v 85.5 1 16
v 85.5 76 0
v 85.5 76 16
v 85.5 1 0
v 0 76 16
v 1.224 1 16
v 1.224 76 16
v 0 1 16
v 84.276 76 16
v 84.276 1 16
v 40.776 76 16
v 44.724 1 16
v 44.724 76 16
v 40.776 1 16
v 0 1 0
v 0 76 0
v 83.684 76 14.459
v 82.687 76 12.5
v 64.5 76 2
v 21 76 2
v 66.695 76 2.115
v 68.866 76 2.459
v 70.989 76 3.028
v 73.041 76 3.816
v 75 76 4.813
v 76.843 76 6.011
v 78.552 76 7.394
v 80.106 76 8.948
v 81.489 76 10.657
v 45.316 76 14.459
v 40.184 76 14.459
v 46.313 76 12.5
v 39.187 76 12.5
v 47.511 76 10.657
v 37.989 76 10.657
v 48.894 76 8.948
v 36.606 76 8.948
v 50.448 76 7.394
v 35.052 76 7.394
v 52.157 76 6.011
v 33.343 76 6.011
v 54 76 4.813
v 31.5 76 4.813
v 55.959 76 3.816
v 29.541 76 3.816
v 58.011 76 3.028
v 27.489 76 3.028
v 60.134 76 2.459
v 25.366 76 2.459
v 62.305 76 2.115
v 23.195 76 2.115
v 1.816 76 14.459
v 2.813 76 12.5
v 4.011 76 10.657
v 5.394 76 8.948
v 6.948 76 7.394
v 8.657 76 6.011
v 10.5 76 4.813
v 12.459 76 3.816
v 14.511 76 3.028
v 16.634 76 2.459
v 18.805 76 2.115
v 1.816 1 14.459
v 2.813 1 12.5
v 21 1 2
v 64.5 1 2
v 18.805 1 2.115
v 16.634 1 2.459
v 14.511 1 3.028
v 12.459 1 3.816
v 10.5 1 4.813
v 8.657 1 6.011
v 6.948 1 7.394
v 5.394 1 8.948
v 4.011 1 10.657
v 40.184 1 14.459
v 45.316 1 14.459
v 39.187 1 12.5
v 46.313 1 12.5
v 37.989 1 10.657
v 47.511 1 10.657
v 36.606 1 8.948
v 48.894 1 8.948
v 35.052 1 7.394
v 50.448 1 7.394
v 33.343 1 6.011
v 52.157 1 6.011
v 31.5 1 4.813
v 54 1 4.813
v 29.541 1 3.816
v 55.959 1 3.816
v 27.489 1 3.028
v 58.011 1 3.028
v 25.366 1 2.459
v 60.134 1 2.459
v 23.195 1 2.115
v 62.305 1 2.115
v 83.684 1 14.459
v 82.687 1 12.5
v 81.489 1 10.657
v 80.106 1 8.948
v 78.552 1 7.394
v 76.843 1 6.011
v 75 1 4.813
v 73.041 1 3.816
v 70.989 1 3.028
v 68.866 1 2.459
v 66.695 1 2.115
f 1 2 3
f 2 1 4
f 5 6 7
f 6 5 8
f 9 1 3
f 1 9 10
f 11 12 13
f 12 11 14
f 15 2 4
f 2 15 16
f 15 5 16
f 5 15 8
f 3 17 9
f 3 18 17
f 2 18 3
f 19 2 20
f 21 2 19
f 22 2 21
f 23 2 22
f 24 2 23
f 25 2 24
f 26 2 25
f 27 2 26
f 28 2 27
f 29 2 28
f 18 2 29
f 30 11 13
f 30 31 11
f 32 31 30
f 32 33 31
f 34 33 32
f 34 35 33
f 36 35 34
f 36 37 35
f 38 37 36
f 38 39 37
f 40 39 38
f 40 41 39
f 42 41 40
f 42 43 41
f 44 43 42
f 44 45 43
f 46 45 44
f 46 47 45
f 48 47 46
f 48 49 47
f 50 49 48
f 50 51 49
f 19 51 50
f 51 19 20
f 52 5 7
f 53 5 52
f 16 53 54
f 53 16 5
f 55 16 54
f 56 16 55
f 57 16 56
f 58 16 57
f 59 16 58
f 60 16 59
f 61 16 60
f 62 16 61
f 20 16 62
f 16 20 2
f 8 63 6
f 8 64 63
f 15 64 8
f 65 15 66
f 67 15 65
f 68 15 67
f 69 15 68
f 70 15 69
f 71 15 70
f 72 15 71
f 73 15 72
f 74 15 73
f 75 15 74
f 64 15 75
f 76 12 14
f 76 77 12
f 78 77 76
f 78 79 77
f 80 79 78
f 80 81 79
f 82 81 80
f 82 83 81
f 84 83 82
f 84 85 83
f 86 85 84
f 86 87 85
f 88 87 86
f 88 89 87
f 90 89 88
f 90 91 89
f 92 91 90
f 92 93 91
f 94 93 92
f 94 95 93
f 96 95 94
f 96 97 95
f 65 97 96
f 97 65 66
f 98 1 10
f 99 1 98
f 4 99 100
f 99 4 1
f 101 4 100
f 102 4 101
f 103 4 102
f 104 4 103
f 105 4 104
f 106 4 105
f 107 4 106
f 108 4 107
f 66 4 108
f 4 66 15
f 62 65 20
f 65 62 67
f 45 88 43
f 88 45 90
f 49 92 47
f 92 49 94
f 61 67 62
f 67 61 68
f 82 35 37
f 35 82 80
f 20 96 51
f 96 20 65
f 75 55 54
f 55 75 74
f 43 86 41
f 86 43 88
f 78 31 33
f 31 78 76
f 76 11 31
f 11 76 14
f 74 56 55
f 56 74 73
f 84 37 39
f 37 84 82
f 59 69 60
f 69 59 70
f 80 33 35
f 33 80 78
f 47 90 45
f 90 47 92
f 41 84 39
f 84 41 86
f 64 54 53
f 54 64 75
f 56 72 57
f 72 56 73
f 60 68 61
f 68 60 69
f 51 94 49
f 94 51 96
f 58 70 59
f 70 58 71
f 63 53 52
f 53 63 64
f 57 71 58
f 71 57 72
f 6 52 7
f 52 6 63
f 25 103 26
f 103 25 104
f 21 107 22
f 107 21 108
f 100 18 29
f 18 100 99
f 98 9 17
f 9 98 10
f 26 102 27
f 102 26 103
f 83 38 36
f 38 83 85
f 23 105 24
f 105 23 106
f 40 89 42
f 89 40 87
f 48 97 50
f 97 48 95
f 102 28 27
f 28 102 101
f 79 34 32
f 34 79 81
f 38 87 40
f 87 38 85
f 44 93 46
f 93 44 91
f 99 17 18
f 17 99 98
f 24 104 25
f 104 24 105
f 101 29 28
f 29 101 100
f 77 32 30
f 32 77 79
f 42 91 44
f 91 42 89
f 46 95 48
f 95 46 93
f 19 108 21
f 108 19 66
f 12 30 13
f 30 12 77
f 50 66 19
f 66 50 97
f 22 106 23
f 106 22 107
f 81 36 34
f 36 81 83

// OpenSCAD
// =============================================
// 3D: Horizontal Holder for 2 Bottles (75x42)
// Version: 1.0
// Author: ChatGPT (OpenSCAD)
// =============================================

// ----------------------------
description = "Horizontal holder for 2 bottles, d=42, len=75";

// Shared library
use <../modules.scad>

// ----------------------------
// Параметры модели
// ----------------------------
bottle_diam   = 42;      // диаметр бутылки, мм
bottle_y      = 75;     // длина бутылки по Y, мм
num_bottles   = 2;       // количество бутылок в ряду (по Y)
pad_between   = 1.5;     // прокладка/зазор между бутылками (1–2 мм)

// Габариты/толщины
rail_w        = 0;       // боковые рельсы убраны
rail_h        = 6;       // высота рельса по Z, мм
base_th       = 2;       // толщина тонкой базы между рельсами, мм
bridge_th     = 2;       // толщина облегчённых перемычек (мостов), мм
bridge_pitch  = 35;      // шаг перемычек по X, мм
end_stop_h    = 10;       // высота торцевых упоров, мм
end_stop_th   = 1;       // толщина торцевых упоров по X, мм
max_h         = 50;      // ограничение по высоте всей детали, мм

// Скругление краёв через minkowski
use_minkowski = false;    // включить скругление краёв
minkowski_r   = 1;       // радиус сферы для скругления, мм

// ----------------------------
// Настройка точности
// ----------------------------
$fn = 0;        // фиксированную сегментацию отключаем
$fa = 6;        // 5–8° обычно достаточно
$fs = 0.35;     // ≈ диаметр сопла (0.3–0.5 для сопла 0.4)
pin_fs = 0.25;  // для цилиндров высокой точности

// ----------------------------
// Тестовые фрагменты
// ----------------------------
test_fragment = false;  // true — печатать только укороченные фрагменты
frag_size     = 20;     // размер окна вырезки по XY
frag_index    = 0;      // 0=НЛ, 1=ВЛ, 2=НП, 3=ВП (относительно основания)
frag_gap_x    = 10;     // зазор между фрагментами по X, мм
frag_h_extra  = 12;     // запас по высоте клипа, мм

// Вычисляемые размеры
inner_w = num_bottles*bottle_diam + (num_bottles-1)*pad_between;      // рабочая ширина между рельсами
tot_w   = inner_w;// + 2*rail_w;                                          // общая ширина
tot_y   = bottle_y + end_stop_th;                                    // общая длина по Y (с упорами)

// Низкий подпрофиль «ложемента» — высота положительного сегмента
saddle_h = min(max_h - rail_h, bottle_diam/3);                         // не выше трети диаметра
saddle_w = max(bottle_diam/2, 12);                                     // ширина контакта по Y
// Срез по Z сверху на высоте торцевого упора
z_cap  = rail_h + end_stop_h;
// Полная высота модели для переворота по Z
total_h = z_cap;

// Центры бутылок по X (ранее по Y)
function bottle_center_x(i) = bottle_diam/2 + i*(bottle_diam + pad_between);

// ----------------------------
// Вспомогательные модули
// ----------------------------
// Режущий цилиндр для выемки (полуканавка) вдоль Y, ограниченный по высоте
module saddle_cutter(center_x){
    z_offset = 0;//bottle_diam / 10 * -1;
    intersection(){
        // цилиндр вдоль Y, начинается после нижнего упора и заканчивается перед верхним
        translate([center_x, end_stop_th, bottle_diam/2 + base_th])
            rotate([-90,0,0])
                cylinder(h=bottle_y, d=bottle_diam, $fs=pin_fs, $fa=6);
        // ограничиваем область выемки только внутренней зоной между рельсами и по Z до z_cap
        translate([0, end_stop_th, z_offset])
            cube([inner_w, bottle_y, z_cap], center=false);
    }
}


// Торцевые упоры по Y только между рельсами
module end_stop(){
    // у верхнего края
    translate([rail_w, tot_y - end_stop_th, rail_h]) cube([inner_w, end_stop_th, end_stop_h], center=false);
}

// Объединение всех выемок
module cradle_cuts(){
    for(i = [0 : num_bottles-1])
        saddle_cutter(bottle_center_x(i));
    // Убираем внешние стенки по краям: дополнительные полуканавки за пределами рабочей области
    saddle_cutter(-bottle_diam/2);
    saddle_cutter(inner_w + bottle_diam/2);
}

// Срезающий параллелепипед для верхней плоскости
module cut_top(){
    translate(v = [-10, -10, -z_cap])
        cube([inner_w+20, tot_y+20, 24], center=false);
}

// Сплошная внутреняя плита между рельсами на высоту выемки (будет облегчена вычитанием цилиндров)
module deck_core(){
    translate([0, end_stop_th, 0])
        cube([inner_w, bottle_y, z_cap], center=false);
}

// Полная сборка (сырая, без финального среза по Z)
module base_raw(){
    difference(){
        union(){
            deck_core();
            end_stop();
        }
        cradle_cuts();
        // cut_top();
    }
}

// Срезаем верх по z_cap на всякий случай
module base(){
    if (use_minkowski) {
        minkowski() {
            base_raw();
            sphere(r=minkowski_r, $fs=pin_fs, $fa=6);
        }
    } else {
        base_raw();
    }
}

// ----------------------------
// Клиппер фрагментов
// ----------------------------
module clip_for_fragments(){
    if(test_fragment){
        // Фрагмент у нижнего торца (по Y)
        intersection(){
            children();
            translate([-eps(), -eps(), -frag_h_extra])
                cube([tot_w + 2*eps(), frag_size, rail_h + end_stop_h + saddle_h + 2*frag_h_extra], center=false);
        }
        // Фрагмент у верхнего торца (по Y)
        translate([0, frag_size + frag_gap_x, 0])
            intersection(){
                children();
                translate([-eps(), tot_y - frag_size, -frag_h_extra])
                    cube([tot_w + 2*eps(), frag_size + eps(), rail_h + end_stop_h + saddle_h + 2*frag_h_extra], center=false);
            }
    }else{
        children();
    }
}

// Вывод модели
module flipped(){
    // Переворачиваем по Z так, чтобы низ был на Z=0
    translate([0,0,0]) mirror([0,0,0]) base();
}

clip_for_fragments() flipped();
